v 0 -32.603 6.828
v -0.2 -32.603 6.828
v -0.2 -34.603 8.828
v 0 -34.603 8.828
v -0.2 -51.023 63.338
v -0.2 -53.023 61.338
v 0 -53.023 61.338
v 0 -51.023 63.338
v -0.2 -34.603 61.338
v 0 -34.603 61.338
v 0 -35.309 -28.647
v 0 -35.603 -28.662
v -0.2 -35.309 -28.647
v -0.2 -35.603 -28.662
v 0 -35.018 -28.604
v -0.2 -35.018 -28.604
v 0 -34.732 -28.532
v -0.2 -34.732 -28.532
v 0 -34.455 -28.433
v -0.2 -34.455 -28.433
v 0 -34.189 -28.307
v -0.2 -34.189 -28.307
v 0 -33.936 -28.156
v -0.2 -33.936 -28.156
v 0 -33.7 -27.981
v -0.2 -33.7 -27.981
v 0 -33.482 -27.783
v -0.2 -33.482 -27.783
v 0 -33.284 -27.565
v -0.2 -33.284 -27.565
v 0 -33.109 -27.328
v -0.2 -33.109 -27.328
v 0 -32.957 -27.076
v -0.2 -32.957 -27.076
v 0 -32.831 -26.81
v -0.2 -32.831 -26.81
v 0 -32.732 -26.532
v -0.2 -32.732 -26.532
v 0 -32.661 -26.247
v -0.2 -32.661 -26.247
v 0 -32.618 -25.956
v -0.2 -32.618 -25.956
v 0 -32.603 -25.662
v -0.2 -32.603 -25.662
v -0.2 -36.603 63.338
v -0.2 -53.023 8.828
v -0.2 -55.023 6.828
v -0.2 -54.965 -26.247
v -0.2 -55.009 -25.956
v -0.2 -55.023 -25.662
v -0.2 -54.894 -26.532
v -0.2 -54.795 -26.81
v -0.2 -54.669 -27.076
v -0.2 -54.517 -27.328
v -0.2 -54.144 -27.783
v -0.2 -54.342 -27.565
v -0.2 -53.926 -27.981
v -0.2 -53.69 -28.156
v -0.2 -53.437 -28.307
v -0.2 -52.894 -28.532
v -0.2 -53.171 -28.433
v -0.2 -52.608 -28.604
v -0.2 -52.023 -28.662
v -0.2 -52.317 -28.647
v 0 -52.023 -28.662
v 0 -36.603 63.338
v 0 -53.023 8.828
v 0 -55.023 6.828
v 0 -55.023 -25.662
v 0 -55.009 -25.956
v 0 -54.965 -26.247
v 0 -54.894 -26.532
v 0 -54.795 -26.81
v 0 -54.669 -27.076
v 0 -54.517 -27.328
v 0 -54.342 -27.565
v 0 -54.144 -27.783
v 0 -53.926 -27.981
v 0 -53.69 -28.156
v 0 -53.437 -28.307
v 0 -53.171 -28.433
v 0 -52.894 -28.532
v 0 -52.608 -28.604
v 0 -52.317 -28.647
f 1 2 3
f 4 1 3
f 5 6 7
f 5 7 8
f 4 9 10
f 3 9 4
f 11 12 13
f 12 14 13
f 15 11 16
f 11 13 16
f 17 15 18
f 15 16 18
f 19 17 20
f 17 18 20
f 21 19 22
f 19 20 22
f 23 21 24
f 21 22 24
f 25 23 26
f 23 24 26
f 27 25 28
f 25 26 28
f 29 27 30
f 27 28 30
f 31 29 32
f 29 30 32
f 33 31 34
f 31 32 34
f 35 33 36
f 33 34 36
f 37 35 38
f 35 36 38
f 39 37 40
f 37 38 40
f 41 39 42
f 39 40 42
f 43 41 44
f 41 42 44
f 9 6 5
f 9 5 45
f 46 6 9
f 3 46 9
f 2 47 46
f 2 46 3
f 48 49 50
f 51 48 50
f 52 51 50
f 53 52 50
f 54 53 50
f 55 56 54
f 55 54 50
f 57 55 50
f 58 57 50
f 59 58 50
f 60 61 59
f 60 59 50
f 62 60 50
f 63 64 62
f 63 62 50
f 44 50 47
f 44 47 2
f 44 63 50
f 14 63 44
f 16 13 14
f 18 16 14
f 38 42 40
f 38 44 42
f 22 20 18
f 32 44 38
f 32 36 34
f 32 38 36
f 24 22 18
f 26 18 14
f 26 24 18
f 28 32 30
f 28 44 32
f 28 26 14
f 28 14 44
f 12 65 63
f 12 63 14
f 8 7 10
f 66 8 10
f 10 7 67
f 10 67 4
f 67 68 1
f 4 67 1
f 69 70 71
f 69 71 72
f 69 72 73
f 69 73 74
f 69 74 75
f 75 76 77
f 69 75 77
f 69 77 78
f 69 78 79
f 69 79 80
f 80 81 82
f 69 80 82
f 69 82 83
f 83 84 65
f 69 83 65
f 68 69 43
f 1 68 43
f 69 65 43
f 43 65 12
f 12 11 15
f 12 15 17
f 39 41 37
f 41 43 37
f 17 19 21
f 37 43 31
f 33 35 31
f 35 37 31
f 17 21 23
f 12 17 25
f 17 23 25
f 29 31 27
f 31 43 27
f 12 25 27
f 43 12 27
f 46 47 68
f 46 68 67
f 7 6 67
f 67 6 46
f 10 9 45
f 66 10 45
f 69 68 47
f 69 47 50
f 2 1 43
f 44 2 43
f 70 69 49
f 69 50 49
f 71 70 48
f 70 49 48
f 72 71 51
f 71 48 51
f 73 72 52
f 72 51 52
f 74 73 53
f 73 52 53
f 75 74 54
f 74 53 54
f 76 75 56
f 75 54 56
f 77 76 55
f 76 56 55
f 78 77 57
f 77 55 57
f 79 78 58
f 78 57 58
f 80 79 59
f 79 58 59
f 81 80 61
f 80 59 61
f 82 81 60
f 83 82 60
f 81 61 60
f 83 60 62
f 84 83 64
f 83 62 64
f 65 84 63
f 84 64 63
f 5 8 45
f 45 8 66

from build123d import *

# Parameters (mm, degrees)
SKETCH2_W           = 22.42
SKETCH2_H           = 92
BOSS_EXTRUDE2_DEPTH = 0.2
FILLET4_R           = 3
FILLET7_R           = 3
SKETCH4_W           = 2
SKETCH4_H           = 54.51
CUT_EXTRUDE1_DEPTH  = 0.2
SKETCH5_W           = 2
SKETCH5_H           = 54.51
CUT_EXTRUDE2_DEPTH  = 0.2
CUT_EXTRUDE3_DEPTH  = 0.2
CUT_EXTRUDE4_DEPTH  = 0.2
CUT_EXTRUDE7_DEPTH  = 0.2
CUT_EXTRUDE8_DEPTH  = 0.2


with BuildPart() as part:
    # Sketch2 → Boss-Extrude2 (new body)
    with BuildSketch(Plane(origin=(0, 0, 0), x_dir=(0, 1, 0), z_dir=(-1, 0, 0))):
        with Locations((-43.813076923, -17.338461538)):
            Rectangle(SKETCH2_W, SKETCH2_H)
    extrude(amount=BOSS_EXTRUDE2_DEPTH)

    # Fillet4
    fillet4_edges = [part.edges().sort_by_distance(p)[0] for p in [
        (-0.1, -55.023076923, -28.661538462),
    ]]
    fillet(fillet4_edges, radius=FILLET4_R)

    # Fillet7
    fillet7_edges = [part.edges().sort_by_distance(p)[0] for p in [
        (-0.1, -32.603076923, -28.661538462),
    ]]
    fillet(fillet7_edges, radius=FILLET7_R)

    # Sketch4 → Cut-Extrude1 (cut)
    with BuildSketch(Plane(origin=(-0.2, 0, 0), x_dir=(0, 1, 0), z_dir=(-1, 0, 0))):
        with Locations((-54.023076923, -36.083461538)):
            Rectangle(SKETCH4_W, SKETCH4_H)
    extrude(amount=-CUT_EXTRUDE1_DEPTH, mode=Mode.SUBTRACT)

    # Sketch5 → Cut-Extrude2 (cut)
    with BuildSketch(Plane(origin=(-0.2, 0, 0), x_dir=(0, 1, 0), z_dir=(-1, 0, 0))):
        with Locations((-33.603076923, -36.083461538)):
            Rectangle(SKETCH5_W, SKETCH5_H)
    extrude(amount=-CUT_EXTRUDE2_DEPTH, mode=Mode.SUBTRACT)

    # Sketch6 → Cut-Extrude3 (cut)
    with BuildSketch(Plane(origin=(-0.2, 0, 0), x_dir=(0, 1, 0), z_dir=(-1, 0, 0))):
        Polygon((-53.023076923, -63.338461538), (-53.023076923, -61.338461538), (-51.023076923, -63.338461538), align=None)
    extrude(amount=-CUT_EXTRUDE3_DEPTH, mode=Mode.SUBTRACT)

    # Sketch7 → Cut-Extrude4 (cut)
    with BuildSketch(Plane(origin=(-0.2, 0, 0), x_dir=(0, 1, 0), z_dir=(-1, 0, 0))):
        Polygon((-34.603076923, -63.338461538), (-34.603076923, -61.338461538), (-36.603076923, -63.338461538), align=None)
    extrude(amount=-CUT_EXTRUDE4_DEPTH, mode=Mode.SUBTRACT)

    # Sketch8 → Cut-Extrude7 (cut)
    with BuildSketch(Plane(origin=(-0.2, 0, 0), x_dir=(0, 1, 0), z_dir=(-1, 0, 0))):
        Polygon((-53.023076923, -8.828461538), (-55.023076923, -8.828461538), (-55.023076923, -6.828461538), align=None)
    extrude(amount=-CUT_EXTRUDE7_DEPTH, mode=Mode.SUBTRACT)

    # Sketch9 → Cut-Extrude8 (cut)
    with BuildSketch(Plane(origin=(-0.2, 0, 0), x_dir=(0, 1, 0), z_dir=(-1, 0, 0))):
        Polygon((-34.603076923, -8.828461538), (-32.603076923, -8.828461538), (-32.603076923, -6.828461538), align=None)
    extrude(amount=-CUT_EXTRUDE8_DEPTH, mode=Mode.SUBTRACT)


solid = part.part
